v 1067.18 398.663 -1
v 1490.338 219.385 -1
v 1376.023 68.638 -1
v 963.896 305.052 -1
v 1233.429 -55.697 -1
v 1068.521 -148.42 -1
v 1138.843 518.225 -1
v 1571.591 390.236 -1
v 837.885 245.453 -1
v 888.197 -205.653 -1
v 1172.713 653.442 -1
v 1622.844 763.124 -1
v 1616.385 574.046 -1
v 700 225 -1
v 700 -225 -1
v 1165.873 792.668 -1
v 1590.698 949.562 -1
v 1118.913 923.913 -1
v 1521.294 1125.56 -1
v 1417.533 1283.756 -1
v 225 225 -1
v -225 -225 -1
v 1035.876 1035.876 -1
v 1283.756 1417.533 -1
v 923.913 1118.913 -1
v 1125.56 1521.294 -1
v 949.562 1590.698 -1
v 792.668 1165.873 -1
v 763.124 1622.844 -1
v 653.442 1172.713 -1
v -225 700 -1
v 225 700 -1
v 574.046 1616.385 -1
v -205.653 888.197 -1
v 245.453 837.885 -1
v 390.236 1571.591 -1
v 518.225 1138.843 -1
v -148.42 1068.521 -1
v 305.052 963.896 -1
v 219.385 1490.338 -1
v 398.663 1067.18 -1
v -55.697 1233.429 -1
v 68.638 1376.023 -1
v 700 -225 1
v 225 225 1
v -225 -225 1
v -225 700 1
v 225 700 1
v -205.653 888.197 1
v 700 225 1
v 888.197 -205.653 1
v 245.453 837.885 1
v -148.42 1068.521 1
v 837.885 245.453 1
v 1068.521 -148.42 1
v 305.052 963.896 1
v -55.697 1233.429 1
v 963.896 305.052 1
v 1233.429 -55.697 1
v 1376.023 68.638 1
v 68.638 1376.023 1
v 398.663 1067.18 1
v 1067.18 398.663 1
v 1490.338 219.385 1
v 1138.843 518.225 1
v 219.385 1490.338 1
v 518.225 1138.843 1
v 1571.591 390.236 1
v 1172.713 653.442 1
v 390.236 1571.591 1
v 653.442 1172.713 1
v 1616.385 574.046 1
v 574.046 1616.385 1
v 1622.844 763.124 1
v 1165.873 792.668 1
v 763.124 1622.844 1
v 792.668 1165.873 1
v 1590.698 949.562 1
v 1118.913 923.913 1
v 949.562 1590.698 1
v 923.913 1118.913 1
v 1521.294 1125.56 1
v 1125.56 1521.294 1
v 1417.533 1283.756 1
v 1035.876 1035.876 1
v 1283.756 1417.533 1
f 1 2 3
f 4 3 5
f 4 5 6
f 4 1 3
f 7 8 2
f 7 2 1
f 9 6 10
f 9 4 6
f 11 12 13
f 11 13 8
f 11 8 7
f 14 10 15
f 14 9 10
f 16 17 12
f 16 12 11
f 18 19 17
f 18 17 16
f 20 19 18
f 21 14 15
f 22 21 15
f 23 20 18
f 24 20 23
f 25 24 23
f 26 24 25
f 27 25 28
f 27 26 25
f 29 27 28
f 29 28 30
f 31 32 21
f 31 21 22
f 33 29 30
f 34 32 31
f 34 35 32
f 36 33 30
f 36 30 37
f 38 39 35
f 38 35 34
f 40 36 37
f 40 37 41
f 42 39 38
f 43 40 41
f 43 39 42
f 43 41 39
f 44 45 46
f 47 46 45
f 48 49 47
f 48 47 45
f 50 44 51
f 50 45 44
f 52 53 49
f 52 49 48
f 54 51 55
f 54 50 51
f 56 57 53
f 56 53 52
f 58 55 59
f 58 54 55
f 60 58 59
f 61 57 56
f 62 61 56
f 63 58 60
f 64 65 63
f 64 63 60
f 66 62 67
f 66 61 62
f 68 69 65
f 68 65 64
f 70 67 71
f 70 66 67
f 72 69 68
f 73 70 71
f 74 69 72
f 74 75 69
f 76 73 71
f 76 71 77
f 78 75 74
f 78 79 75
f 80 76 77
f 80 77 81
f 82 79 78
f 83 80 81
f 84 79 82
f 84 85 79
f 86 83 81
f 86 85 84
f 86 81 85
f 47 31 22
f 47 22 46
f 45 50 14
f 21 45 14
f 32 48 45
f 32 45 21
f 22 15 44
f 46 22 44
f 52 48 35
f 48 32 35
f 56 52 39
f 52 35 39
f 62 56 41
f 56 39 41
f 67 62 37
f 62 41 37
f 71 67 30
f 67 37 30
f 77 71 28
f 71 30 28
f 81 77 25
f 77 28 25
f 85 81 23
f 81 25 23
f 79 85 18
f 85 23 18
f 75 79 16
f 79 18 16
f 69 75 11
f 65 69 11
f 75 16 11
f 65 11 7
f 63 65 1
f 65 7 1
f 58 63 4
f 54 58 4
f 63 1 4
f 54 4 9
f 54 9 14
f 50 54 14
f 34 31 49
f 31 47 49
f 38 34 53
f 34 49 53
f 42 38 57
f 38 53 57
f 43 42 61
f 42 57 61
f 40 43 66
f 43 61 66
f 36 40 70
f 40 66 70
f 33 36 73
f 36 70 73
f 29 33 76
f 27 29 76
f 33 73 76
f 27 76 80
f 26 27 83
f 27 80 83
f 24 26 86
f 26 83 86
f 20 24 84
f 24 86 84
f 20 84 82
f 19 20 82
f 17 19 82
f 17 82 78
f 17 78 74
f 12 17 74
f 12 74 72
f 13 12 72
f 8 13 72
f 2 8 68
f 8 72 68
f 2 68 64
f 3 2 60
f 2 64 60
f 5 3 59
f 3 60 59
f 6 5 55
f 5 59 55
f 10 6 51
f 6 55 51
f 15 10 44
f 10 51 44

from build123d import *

# Parameters (mm, degrees)
SKETCH_2_W = 450
SKETCH_2_H = 2


with BuildPart() as part:
    # 扫描1: sweep along a path in 草图1
    with BuildLine(Plane.XY) as sweep_1_path:
        Line((0, 0), (0, 700))
        ThreePointArc((0, 700), (1194.974746831, 1194.974746831), (700, 0))
        Line((700, 0), (0, 0))
    # 草图2 → 扫描1 (sweep)
    with BuildSketch(Plane(origin=(0, 0, 0), x_dir=(1, 0, 0), z_dir=(0, 1, 0))):
        Rectangle(SKETCH_2_W, SKETCH_2_H)
    sweep(path=sweep_1_path.line, transition=Transition.RIGHT)


solid = part.part
